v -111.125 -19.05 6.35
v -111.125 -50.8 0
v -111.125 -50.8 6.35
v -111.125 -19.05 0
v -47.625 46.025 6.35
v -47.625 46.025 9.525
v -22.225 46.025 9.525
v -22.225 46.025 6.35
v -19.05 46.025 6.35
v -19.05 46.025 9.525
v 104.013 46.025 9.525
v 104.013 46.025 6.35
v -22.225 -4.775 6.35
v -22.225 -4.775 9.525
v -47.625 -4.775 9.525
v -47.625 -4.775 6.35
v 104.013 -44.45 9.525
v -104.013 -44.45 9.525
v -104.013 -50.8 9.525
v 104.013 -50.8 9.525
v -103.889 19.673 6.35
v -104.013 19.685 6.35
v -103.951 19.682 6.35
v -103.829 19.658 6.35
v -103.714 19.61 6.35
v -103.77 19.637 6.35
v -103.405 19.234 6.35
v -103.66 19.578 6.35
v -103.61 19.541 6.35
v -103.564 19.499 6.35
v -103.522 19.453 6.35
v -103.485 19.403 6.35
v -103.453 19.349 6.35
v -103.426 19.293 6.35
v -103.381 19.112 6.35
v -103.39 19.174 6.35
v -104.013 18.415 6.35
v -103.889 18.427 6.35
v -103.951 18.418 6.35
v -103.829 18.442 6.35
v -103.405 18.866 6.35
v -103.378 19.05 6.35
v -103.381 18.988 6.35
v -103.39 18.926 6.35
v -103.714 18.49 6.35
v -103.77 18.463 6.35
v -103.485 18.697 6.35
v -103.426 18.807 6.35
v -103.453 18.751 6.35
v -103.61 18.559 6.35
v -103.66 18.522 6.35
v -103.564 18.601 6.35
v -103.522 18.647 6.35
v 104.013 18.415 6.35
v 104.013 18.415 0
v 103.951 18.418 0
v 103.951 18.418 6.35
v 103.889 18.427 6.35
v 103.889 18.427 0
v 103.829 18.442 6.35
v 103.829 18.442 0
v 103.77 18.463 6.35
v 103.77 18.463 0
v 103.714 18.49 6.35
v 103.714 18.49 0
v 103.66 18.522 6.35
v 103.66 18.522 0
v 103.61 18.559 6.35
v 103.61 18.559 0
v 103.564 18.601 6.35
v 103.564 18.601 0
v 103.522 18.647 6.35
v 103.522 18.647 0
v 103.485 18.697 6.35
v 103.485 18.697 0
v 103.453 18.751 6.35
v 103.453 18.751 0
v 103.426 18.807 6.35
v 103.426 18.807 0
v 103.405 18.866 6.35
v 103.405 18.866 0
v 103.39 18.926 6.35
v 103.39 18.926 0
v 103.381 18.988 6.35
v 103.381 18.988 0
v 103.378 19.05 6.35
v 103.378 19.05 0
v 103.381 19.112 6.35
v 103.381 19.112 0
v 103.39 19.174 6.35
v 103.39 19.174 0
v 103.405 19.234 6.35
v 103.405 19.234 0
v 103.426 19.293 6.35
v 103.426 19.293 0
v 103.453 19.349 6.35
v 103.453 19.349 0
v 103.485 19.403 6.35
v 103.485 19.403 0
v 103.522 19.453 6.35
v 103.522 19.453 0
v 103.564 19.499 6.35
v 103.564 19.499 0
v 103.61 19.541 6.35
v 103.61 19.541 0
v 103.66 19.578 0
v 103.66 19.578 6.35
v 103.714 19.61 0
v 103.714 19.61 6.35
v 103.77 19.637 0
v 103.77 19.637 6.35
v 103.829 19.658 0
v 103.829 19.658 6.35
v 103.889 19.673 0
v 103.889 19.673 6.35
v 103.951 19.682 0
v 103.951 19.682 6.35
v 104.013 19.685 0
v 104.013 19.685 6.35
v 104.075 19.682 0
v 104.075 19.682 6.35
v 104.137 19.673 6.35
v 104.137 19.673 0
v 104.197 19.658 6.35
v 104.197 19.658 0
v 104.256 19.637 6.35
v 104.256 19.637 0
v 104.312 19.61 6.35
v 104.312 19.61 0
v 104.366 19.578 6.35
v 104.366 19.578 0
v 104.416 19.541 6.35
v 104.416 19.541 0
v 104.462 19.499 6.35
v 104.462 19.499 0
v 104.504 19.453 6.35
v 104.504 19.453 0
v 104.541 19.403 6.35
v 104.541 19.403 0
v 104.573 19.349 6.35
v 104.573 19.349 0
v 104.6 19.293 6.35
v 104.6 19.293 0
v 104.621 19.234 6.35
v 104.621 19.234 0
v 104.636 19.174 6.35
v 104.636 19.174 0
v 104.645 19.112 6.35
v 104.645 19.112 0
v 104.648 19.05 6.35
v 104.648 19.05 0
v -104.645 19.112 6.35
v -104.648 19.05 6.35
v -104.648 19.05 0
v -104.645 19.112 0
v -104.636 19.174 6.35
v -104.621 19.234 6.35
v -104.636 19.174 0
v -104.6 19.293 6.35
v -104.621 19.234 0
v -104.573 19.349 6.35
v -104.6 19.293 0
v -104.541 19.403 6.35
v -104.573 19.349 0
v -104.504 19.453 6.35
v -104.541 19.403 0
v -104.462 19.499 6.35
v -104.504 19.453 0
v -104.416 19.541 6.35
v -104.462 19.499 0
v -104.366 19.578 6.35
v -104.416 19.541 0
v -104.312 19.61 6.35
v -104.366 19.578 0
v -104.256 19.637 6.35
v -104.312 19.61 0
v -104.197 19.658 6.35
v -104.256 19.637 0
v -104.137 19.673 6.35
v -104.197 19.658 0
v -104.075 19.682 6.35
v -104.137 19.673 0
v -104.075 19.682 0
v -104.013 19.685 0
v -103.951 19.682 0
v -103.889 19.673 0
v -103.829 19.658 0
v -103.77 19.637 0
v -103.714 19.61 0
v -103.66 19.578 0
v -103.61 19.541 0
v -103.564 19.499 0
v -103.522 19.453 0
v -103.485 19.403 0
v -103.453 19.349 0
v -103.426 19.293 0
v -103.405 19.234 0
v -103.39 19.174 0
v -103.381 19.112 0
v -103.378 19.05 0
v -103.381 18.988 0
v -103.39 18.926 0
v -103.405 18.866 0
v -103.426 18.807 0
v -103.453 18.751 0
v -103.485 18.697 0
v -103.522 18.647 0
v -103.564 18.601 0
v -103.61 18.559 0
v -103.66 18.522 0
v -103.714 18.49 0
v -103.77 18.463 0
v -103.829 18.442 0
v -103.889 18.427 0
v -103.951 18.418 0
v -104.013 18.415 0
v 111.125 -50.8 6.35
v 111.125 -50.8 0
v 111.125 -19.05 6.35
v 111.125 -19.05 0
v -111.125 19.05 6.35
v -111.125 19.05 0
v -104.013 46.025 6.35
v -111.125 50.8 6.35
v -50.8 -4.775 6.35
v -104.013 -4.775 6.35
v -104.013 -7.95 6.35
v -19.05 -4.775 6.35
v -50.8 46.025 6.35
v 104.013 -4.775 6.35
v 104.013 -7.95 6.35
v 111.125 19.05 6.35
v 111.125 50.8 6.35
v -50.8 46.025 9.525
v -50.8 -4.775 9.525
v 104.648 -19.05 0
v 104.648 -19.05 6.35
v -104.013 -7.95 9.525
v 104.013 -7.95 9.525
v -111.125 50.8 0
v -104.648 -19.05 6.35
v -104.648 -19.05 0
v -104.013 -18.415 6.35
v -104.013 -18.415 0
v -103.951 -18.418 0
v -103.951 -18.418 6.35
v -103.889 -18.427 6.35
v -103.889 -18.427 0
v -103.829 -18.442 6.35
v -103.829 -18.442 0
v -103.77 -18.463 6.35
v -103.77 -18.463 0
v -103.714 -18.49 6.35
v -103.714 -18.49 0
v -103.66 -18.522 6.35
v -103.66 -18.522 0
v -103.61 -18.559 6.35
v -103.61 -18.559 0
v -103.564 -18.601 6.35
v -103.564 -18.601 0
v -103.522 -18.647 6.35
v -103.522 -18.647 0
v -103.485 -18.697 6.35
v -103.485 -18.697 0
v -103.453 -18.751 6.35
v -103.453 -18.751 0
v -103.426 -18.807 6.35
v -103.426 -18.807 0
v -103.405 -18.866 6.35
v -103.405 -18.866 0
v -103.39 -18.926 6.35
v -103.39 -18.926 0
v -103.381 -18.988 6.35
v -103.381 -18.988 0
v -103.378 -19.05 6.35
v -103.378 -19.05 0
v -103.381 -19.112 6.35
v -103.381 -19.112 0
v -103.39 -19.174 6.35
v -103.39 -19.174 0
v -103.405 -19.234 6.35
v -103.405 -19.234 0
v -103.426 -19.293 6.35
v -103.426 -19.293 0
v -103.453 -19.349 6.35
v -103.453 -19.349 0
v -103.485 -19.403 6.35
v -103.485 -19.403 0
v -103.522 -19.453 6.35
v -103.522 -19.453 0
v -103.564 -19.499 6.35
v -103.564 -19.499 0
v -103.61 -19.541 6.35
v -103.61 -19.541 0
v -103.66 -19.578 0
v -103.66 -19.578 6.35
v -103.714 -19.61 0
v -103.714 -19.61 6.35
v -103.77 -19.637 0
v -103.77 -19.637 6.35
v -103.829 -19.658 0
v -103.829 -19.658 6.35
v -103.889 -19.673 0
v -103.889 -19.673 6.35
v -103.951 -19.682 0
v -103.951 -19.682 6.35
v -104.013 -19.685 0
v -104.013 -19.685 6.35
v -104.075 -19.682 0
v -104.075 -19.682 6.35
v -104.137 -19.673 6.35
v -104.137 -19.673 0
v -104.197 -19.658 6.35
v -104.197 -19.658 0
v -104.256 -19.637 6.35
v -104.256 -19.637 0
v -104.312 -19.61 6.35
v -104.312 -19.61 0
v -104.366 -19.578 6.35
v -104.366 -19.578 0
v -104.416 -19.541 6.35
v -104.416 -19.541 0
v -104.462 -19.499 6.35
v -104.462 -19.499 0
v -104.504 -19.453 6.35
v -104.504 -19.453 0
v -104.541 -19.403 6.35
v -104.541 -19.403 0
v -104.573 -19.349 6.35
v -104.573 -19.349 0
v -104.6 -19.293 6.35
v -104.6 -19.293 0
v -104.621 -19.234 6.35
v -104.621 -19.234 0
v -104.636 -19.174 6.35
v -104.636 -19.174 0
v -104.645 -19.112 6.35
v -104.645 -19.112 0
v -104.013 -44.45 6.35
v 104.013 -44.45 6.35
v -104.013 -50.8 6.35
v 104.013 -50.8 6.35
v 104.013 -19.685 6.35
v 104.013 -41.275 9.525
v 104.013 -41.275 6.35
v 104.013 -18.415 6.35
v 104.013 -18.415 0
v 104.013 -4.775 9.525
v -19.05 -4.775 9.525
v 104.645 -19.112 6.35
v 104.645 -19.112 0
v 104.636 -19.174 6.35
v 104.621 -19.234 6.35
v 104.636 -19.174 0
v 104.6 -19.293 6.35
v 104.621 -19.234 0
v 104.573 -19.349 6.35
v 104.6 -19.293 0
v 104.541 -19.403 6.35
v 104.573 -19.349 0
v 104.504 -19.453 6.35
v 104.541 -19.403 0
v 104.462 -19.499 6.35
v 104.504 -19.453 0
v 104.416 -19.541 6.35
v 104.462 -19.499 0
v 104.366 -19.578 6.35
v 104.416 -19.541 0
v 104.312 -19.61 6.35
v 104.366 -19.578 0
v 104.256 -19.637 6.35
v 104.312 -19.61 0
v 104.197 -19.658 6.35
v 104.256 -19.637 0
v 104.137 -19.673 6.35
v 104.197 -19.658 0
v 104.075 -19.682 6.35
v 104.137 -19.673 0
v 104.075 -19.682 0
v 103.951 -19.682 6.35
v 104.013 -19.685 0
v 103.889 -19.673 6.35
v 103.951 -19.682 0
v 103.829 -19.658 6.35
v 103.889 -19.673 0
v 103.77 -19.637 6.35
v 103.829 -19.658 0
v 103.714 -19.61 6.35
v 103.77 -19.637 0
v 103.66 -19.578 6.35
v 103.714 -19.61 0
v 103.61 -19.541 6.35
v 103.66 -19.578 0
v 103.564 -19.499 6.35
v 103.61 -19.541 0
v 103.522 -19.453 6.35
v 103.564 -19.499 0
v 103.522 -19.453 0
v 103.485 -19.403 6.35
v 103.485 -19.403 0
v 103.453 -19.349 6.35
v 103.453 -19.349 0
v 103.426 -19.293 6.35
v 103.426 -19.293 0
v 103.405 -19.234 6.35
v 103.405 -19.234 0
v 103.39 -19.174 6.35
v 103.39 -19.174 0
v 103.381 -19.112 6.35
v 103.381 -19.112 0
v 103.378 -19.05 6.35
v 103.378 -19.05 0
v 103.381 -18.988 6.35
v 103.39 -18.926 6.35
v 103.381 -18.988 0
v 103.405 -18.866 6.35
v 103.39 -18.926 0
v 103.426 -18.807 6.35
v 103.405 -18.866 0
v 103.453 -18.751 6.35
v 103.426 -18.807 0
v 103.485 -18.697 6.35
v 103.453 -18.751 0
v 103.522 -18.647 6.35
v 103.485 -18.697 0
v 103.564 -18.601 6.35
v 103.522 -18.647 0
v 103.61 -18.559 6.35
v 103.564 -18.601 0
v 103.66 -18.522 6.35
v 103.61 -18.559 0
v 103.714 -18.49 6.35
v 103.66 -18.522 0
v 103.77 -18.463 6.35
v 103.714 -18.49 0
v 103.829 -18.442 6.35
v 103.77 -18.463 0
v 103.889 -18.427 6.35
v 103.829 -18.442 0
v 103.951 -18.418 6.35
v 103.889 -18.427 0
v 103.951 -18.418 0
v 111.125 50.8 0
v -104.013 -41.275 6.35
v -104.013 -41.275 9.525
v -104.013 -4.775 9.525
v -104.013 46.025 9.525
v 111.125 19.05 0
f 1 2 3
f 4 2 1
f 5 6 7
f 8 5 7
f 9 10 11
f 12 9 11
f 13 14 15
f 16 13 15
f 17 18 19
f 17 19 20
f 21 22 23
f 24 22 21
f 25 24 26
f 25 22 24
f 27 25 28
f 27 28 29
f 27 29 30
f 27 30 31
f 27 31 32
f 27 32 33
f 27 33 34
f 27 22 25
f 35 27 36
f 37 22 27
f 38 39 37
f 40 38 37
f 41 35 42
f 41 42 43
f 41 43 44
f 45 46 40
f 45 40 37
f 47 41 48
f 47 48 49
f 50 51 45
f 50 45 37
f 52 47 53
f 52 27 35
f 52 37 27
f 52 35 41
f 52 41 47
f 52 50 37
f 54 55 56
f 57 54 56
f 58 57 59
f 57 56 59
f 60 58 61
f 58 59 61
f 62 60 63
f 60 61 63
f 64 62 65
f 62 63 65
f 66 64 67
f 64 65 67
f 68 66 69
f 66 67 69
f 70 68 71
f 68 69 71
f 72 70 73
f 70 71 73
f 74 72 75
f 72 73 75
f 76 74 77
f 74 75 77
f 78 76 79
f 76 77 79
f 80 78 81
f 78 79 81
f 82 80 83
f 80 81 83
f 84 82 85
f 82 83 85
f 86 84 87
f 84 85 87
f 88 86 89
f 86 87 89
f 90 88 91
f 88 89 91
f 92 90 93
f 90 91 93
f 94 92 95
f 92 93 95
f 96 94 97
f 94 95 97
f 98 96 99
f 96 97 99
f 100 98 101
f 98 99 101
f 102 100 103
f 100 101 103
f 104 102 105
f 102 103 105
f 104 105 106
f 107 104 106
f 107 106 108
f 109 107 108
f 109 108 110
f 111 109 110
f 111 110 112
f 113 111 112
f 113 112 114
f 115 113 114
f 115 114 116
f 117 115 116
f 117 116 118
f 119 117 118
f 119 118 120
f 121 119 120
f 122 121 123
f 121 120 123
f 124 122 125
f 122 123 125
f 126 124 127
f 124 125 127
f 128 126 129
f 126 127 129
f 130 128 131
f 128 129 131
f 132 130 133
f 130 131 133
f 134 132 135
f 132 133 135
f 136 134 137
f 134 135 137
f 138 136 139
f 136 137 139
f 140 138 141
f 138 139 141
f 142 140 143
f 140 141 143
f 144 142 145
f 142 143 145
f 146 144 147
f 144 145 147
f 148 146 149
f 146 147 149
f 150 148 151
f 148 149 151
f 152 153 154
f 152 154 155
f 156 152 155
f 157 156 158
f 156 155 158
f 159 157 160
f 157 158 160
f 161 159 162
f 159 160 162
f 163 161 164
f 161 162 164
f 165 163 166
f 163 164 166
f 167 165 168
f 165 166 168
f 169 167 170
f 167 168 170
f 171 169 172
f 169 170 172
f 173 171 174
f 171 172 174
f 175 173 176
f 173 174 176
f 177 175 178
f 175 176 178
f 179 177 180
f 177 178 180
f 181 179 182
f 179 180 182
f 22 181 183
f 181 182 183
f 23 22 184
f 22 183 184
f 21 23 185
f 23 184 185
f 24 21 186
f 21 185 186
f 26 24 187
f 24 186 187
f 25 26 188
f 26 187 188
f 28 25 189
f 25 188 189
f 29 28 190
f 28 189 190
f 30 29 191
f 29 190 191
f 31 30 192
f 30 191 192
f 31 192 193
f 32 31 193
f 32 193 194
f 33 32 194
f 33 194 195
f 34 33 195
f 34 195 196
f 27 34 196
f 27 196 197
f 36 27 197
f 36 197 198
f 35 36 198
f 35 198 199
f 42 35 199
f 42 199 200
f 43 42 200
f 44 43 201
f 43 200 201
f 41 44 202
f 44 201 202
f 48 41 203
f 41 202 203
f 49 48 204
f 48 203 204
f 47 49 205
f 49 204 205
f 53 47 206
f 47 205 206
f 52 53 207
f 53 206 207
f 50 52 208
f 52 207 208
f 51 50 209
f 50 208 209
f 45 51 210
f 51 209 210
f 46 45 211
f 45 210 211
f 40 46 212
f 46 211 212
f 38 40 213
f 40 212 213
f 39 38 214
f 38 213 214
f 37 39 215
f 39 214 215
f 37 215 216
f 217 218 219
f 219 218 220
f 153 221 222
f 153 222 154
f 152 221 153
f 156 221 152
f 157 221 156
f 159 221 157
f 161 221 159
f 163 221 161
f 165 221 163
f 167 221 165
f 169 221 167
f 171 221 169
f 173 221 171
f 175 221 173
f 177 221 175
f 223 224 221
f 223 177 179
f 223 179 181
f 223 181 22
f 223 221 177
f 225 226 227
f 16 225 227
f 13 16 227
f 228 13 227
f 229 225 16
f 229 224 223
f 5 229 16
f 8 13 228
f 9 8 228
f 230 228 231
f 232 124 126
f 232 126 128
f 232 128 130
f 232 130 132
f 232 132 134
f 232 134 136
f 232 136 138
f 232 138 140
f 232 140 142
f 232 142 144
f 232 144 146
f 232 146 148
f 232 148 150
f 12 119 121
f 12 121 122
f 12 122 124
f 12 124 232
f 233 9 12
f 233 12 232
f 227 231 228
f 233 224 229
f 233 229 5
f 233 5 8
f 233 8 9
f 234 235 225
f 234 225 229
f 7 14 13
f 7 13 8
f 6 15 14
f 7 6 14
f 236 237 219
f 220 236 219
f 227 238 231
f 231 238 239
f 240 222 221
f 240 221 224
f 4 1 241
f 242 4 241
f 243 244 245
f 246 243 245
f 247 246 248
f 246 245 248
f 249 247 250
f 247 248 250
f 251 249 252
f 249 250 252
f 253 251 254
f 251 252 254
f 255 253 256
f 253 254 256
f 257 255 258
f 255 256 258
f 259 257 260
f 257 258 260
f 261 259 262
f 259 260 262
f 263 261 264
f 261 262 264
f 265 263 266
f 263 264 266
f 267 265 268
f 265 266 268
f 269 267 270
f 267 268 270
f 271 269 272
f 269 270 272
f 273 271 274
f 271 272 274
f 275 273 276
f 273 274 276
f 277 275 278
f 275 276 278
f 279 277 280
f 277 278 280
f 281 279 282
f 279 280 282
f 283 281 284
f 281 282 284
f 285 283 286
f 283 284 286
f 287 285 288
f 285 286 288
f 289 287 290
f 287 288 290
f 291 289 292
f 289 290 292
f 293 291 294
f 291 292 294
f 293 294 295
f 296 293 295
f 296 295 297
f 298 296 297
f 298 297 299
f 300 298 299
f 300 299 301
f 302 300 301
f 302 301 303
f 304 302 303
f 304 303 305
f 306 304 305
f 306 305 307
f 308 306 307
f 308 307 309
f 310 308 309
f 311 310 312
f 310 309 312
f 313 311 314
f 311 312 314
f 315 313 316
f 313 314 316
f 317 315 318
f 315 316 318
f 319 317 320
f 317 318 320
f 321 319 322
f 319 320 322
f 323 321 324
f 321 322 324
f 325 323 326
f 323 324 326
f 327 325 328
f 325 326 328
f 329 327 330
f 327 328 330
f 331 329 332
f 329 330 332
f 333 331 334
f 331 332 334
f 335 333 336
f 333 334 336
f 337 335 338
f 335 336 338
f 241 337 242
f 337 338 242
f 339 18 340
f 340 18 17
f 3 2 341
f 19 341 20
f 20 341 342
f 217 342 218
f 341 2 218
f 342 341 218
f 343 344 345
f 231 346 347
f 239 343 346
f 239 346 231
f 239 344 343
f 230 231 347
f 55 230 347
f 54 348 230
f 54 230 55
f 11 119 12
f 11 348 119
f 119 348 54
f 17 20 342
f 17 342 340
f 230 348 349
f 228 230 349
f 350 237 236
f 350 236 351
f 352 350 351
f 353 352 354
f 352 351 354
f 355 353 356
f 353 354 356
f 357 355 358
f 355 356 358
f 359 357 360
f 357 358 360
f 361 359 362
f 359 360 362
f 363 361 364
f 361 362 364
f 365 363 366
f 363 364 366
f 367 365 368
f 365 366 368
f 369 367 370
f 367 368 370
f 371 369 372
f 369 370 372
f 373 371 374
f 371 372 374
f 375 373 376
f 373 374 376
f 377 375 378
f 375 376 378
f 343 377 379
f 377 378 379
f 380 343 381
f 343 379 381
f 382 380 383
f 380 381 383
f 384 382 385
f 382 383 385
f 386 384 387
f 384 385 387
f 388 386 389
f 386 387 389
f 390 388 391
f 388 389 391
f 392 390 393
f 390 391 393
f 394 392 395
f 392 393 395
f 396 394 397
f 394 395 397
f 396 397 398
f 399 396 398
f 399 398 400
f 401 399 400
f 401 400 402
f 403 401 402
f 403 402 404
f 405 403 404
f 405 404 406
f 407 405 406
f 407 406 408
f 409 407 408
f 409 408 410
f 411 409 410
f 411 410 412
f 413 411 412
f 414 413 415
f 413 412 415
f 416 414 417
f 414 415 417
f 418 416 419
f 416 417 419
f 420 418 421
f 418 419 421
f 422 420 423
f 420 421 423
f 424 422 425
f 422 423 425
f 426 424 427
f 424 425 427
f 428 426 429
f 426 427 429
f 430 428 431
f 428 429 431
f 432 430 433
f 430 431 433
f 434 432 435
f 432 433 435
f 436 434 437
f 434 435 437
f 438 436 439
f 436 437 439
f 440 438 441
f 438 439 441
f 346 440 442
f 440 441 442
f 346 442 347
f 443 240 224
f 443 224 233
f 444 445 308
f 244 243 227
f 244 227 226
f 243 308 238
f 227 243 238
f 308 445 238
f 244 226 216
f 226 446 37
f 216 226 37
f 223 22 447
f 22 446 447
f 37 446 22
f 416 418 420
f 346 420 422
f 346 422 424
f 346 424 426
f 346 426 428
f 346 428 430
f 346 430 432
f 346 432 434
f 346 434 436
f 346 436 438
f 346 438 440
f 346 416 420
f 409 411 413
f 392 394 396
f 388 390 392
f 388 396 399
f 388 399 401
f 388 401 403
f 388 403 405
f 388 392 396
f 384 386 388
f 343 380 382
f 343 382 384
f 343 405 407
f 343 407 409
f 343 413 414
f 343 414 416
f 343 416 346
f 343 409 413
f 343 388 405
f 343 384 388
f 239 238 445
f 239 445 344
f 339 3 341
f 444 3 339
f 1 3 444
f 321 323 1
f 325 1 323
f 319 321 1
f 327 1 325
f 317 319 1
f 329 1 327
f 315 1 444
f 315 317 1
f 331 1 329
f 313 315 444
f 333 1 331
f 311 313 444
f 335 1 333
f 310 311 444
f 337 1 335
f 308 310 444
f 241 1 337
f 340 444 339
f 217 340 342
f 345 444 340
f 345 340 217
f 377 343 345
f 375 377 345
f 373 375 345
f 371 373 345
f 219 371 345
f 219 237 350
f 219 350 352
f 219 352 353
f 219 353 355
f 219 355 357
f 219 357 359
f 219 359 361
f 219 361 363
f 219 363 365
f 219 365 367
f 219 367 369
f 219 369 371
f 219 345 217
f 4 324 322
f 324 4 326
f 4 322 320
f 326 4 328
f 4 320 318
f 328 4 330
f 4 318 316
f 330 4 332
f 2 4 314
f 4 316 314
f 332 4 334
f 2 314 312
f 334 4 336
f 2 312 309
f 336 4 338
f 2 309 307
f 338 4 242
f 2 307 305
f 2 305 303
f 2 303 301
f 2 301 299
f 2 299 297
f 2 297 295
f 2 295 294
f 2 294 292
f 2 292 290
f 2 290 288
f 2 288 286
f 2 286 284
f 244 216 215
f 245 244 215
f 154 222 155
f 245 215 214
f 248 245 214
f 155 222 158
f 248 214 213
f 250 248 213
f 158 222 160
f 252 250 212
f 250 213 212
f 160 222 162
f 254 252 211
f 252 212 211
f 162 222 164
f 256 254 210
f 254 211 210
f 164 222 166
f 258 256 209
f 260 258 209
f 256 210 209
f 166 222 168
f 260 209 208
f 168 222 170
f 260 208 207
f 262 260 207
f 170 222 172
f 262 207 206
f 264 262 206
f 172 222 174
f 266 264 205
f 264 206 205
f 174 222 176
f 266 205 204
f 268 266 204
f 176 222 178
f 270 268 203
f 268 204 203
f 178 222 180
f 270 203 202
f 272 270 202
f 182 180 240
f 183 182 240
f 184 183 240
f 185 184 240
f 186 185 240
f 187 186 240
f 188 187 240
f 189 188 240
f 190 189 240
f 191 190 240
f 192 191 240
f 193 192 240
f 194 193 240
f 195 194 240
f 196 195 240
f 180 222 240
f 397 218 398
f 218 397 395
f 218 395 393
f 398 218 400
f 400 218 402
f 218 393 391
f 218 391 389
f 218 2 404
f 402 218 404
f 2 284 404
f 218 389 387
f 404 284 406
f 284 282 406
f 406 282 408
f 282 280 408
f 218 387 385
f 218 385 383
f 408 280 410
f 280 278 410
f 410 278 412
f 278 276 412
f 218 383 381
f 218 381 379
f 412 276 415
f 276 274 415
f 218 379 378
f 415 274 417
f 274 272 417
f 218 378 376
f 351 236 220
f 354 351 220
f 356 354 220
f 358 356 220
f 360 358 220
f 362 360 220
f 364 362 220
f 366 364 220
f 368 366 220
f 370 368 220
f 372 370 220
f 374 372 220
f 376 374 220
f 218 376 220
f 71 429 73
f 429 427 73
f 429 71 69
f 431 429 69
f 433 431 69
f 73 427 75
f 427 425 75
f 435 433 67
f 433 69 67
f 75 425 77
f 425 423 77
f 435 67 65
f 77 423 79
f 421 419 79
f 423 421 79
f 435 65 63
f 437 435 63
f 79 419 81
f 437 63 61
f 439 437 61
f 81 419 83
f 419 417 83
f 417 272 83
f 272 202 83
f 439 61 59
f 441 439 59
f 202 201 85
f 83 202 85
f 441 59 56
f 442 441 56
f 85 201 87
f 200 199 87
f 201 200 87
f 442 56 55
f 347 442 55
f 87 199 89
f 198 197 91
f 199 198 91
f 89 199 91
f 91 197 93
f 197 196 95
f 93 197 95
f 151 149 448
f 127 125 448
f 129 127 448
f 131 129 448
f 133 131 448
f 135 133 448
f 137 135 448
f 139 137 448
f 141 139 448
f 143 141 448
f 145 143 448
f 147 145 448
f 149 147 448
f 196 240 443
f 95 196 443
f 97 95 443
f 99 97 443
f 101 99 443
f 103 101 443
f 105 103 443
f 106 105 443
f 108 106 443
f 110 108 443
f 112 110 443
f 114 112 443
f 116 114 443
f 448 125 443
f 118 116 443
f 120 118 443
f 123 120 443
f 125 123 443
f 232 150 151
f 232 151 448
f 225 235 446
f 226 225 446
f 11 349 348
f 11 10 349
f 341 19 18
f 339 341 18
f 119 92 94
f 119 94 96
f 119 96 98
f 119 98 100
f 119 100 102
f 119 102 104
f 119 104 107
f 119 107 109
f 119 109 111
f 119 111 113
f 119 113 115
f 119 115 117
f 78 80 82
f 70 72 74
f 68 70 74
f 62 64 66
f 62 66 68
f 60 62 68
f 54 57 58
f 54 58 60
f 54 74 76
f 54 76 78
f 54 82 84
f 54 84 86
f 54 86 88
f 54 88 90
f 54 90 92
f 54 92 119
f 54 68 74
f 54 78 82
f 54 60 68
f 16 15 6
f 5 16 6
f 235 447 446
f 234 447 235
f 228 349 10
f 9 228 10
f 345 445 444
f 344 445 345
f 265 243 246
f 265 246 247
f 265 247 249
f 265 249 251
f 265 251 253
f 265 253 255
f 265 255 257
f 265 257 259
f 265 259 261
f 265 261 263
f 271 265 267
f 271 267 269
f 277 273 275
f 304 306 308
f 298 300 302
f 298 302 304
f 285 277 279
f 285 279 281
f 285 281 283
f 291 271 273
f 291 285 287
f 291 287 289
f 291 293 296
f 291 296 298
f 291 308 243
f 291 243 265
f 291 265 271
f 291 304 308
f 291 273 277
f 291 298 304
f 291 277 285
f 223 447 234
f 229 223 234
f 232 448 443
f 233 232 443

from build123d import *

# Parameters (mm, degrees)
F0_W     = 222.25
F0_H     = 101.6
F1_DEPTH = 9.525
F2_W     = 7.112
F2_H     = 38.1
F3_DEPTH = 9.526
F4_W     = 7.112
F4_H     = 31.75
F5_DEPTH = 3.175
F6_W     = 208.026
F6_H     = 3.175
F6_W_2   = 3.175
F6_H_2   = 50.8
F7_DEPTH = 3.175
F9_DEPTH = 6.35


with BuildPart() as f1:
    # F0 (on Top) → F1 (new body)
    with BuildSketch(Plane.XY):
        Rectangle(F0_W, F0_H)
    extrude(amount=F1_DEPTH)

    # F2 (on face) → F3 (cut, through all)
    with BuildSketch(Plane.XY.offset(9.525)):
        with Locations((-107.569, 0)):
            Rectangle(F2_W, F2_H)
        with Locations((107.569, 0)):
            Rectangle(F2_W, F2_H)
    extrude(amount=-F3_DEPTH, mode=Mode.SUBTRACT)

    # F4 (on face) → F5 (cut)
    with BuildSketch(Plane.XY.offset(9.525)):
        Polygon((-111.125, 19.05), (-104.013, 19.05), (-104.013, 46.0248), (104.013, 46.0248), (104.013, 19.05), (111.125, 19.05), (111.125, 50.8), (-111.125, 50.8), align=None)
        with Locations((-107.569, -34.925)):
            Rectangle(F4_W, F4_H)
        with Locations((107.569, -34.925)):
            Rectangle(F4_W, F4_H)
    extrude(amount=-F5_DEPTH, mode=Mode.SUBTRACT)

    # F6 (on face) → F7 (cut)
    with BuildSketch(Plane.XY.offset(9.525)):
        with Locations((0, -42.8625)):
            Rectangle(F6_W, F6_H)
        Polygon((-50.8, -4.7752), (-104.013, -4.7752), (-104.013, -7.9502), (104.013, -7.9502), (104.013, -4.7752), (-19.05, -4.7752), (-22.225, -4.7752), (-47.625, -4.7752), align=None)
        with Locations((-49.2125, 20.6248)):
            Rectangle(F6_W_2, F6_H_2)
        with Locations((-20.6375, 20.6248)):
            Rectangle(F6_W_2, F6_H_2)
    extrude(amount=-F7_DEPTH, mode=Mode.SUBTRACT)

    # F8 (on face) → F9 (cut, through all)
    with BuildSketch(Plane(origin=(0, 0, 0), x_dir=(1, 0, 0), z_dir=(0, 0, -1))):
        with BuildLine():
            Line((104.013, -19.05), (104.013, -18.415))
            ThreePointArc((104.013, -18.415), (103.563987, -19.499013), (104.648, -19.05))
            Line((104.648, -19.05), (104.013, -19.05))
        make_face()
        with BuildLine():
            ThreePointArc((104.648, 19.05), (103.563987, 19.499013), (104.013, 18.415))
            Line((104.013, 18.415), (104.013, 19.05))
            Line((104.013, 19.05), (104.648, 19.05))
        make_face()
        with BuildLine():
            Line((-104.013, 19.05), (-104.013, 18.415))
            ThreePointArc((-104.013, 18.415), (-103.563987, 19.499013), (-104.648, 19.05))
            Line((-104.648, 19.05), (-104.013, 19.05))
        make_face()
        with BuildLine():
            ThreePointArc((-104.648, -19.05), (-103.563987, -19.499013), (-104.013, -18.415))
            Line((-104.013, -18.415), (-104.013, -19.05))
            Line((-104.013, -19.05), (-104.648, -19.05))
        make_face()
    extrude(amount=-F9_DEPTH, mode=Mode.SUBTRACT)


solid = f1.part
